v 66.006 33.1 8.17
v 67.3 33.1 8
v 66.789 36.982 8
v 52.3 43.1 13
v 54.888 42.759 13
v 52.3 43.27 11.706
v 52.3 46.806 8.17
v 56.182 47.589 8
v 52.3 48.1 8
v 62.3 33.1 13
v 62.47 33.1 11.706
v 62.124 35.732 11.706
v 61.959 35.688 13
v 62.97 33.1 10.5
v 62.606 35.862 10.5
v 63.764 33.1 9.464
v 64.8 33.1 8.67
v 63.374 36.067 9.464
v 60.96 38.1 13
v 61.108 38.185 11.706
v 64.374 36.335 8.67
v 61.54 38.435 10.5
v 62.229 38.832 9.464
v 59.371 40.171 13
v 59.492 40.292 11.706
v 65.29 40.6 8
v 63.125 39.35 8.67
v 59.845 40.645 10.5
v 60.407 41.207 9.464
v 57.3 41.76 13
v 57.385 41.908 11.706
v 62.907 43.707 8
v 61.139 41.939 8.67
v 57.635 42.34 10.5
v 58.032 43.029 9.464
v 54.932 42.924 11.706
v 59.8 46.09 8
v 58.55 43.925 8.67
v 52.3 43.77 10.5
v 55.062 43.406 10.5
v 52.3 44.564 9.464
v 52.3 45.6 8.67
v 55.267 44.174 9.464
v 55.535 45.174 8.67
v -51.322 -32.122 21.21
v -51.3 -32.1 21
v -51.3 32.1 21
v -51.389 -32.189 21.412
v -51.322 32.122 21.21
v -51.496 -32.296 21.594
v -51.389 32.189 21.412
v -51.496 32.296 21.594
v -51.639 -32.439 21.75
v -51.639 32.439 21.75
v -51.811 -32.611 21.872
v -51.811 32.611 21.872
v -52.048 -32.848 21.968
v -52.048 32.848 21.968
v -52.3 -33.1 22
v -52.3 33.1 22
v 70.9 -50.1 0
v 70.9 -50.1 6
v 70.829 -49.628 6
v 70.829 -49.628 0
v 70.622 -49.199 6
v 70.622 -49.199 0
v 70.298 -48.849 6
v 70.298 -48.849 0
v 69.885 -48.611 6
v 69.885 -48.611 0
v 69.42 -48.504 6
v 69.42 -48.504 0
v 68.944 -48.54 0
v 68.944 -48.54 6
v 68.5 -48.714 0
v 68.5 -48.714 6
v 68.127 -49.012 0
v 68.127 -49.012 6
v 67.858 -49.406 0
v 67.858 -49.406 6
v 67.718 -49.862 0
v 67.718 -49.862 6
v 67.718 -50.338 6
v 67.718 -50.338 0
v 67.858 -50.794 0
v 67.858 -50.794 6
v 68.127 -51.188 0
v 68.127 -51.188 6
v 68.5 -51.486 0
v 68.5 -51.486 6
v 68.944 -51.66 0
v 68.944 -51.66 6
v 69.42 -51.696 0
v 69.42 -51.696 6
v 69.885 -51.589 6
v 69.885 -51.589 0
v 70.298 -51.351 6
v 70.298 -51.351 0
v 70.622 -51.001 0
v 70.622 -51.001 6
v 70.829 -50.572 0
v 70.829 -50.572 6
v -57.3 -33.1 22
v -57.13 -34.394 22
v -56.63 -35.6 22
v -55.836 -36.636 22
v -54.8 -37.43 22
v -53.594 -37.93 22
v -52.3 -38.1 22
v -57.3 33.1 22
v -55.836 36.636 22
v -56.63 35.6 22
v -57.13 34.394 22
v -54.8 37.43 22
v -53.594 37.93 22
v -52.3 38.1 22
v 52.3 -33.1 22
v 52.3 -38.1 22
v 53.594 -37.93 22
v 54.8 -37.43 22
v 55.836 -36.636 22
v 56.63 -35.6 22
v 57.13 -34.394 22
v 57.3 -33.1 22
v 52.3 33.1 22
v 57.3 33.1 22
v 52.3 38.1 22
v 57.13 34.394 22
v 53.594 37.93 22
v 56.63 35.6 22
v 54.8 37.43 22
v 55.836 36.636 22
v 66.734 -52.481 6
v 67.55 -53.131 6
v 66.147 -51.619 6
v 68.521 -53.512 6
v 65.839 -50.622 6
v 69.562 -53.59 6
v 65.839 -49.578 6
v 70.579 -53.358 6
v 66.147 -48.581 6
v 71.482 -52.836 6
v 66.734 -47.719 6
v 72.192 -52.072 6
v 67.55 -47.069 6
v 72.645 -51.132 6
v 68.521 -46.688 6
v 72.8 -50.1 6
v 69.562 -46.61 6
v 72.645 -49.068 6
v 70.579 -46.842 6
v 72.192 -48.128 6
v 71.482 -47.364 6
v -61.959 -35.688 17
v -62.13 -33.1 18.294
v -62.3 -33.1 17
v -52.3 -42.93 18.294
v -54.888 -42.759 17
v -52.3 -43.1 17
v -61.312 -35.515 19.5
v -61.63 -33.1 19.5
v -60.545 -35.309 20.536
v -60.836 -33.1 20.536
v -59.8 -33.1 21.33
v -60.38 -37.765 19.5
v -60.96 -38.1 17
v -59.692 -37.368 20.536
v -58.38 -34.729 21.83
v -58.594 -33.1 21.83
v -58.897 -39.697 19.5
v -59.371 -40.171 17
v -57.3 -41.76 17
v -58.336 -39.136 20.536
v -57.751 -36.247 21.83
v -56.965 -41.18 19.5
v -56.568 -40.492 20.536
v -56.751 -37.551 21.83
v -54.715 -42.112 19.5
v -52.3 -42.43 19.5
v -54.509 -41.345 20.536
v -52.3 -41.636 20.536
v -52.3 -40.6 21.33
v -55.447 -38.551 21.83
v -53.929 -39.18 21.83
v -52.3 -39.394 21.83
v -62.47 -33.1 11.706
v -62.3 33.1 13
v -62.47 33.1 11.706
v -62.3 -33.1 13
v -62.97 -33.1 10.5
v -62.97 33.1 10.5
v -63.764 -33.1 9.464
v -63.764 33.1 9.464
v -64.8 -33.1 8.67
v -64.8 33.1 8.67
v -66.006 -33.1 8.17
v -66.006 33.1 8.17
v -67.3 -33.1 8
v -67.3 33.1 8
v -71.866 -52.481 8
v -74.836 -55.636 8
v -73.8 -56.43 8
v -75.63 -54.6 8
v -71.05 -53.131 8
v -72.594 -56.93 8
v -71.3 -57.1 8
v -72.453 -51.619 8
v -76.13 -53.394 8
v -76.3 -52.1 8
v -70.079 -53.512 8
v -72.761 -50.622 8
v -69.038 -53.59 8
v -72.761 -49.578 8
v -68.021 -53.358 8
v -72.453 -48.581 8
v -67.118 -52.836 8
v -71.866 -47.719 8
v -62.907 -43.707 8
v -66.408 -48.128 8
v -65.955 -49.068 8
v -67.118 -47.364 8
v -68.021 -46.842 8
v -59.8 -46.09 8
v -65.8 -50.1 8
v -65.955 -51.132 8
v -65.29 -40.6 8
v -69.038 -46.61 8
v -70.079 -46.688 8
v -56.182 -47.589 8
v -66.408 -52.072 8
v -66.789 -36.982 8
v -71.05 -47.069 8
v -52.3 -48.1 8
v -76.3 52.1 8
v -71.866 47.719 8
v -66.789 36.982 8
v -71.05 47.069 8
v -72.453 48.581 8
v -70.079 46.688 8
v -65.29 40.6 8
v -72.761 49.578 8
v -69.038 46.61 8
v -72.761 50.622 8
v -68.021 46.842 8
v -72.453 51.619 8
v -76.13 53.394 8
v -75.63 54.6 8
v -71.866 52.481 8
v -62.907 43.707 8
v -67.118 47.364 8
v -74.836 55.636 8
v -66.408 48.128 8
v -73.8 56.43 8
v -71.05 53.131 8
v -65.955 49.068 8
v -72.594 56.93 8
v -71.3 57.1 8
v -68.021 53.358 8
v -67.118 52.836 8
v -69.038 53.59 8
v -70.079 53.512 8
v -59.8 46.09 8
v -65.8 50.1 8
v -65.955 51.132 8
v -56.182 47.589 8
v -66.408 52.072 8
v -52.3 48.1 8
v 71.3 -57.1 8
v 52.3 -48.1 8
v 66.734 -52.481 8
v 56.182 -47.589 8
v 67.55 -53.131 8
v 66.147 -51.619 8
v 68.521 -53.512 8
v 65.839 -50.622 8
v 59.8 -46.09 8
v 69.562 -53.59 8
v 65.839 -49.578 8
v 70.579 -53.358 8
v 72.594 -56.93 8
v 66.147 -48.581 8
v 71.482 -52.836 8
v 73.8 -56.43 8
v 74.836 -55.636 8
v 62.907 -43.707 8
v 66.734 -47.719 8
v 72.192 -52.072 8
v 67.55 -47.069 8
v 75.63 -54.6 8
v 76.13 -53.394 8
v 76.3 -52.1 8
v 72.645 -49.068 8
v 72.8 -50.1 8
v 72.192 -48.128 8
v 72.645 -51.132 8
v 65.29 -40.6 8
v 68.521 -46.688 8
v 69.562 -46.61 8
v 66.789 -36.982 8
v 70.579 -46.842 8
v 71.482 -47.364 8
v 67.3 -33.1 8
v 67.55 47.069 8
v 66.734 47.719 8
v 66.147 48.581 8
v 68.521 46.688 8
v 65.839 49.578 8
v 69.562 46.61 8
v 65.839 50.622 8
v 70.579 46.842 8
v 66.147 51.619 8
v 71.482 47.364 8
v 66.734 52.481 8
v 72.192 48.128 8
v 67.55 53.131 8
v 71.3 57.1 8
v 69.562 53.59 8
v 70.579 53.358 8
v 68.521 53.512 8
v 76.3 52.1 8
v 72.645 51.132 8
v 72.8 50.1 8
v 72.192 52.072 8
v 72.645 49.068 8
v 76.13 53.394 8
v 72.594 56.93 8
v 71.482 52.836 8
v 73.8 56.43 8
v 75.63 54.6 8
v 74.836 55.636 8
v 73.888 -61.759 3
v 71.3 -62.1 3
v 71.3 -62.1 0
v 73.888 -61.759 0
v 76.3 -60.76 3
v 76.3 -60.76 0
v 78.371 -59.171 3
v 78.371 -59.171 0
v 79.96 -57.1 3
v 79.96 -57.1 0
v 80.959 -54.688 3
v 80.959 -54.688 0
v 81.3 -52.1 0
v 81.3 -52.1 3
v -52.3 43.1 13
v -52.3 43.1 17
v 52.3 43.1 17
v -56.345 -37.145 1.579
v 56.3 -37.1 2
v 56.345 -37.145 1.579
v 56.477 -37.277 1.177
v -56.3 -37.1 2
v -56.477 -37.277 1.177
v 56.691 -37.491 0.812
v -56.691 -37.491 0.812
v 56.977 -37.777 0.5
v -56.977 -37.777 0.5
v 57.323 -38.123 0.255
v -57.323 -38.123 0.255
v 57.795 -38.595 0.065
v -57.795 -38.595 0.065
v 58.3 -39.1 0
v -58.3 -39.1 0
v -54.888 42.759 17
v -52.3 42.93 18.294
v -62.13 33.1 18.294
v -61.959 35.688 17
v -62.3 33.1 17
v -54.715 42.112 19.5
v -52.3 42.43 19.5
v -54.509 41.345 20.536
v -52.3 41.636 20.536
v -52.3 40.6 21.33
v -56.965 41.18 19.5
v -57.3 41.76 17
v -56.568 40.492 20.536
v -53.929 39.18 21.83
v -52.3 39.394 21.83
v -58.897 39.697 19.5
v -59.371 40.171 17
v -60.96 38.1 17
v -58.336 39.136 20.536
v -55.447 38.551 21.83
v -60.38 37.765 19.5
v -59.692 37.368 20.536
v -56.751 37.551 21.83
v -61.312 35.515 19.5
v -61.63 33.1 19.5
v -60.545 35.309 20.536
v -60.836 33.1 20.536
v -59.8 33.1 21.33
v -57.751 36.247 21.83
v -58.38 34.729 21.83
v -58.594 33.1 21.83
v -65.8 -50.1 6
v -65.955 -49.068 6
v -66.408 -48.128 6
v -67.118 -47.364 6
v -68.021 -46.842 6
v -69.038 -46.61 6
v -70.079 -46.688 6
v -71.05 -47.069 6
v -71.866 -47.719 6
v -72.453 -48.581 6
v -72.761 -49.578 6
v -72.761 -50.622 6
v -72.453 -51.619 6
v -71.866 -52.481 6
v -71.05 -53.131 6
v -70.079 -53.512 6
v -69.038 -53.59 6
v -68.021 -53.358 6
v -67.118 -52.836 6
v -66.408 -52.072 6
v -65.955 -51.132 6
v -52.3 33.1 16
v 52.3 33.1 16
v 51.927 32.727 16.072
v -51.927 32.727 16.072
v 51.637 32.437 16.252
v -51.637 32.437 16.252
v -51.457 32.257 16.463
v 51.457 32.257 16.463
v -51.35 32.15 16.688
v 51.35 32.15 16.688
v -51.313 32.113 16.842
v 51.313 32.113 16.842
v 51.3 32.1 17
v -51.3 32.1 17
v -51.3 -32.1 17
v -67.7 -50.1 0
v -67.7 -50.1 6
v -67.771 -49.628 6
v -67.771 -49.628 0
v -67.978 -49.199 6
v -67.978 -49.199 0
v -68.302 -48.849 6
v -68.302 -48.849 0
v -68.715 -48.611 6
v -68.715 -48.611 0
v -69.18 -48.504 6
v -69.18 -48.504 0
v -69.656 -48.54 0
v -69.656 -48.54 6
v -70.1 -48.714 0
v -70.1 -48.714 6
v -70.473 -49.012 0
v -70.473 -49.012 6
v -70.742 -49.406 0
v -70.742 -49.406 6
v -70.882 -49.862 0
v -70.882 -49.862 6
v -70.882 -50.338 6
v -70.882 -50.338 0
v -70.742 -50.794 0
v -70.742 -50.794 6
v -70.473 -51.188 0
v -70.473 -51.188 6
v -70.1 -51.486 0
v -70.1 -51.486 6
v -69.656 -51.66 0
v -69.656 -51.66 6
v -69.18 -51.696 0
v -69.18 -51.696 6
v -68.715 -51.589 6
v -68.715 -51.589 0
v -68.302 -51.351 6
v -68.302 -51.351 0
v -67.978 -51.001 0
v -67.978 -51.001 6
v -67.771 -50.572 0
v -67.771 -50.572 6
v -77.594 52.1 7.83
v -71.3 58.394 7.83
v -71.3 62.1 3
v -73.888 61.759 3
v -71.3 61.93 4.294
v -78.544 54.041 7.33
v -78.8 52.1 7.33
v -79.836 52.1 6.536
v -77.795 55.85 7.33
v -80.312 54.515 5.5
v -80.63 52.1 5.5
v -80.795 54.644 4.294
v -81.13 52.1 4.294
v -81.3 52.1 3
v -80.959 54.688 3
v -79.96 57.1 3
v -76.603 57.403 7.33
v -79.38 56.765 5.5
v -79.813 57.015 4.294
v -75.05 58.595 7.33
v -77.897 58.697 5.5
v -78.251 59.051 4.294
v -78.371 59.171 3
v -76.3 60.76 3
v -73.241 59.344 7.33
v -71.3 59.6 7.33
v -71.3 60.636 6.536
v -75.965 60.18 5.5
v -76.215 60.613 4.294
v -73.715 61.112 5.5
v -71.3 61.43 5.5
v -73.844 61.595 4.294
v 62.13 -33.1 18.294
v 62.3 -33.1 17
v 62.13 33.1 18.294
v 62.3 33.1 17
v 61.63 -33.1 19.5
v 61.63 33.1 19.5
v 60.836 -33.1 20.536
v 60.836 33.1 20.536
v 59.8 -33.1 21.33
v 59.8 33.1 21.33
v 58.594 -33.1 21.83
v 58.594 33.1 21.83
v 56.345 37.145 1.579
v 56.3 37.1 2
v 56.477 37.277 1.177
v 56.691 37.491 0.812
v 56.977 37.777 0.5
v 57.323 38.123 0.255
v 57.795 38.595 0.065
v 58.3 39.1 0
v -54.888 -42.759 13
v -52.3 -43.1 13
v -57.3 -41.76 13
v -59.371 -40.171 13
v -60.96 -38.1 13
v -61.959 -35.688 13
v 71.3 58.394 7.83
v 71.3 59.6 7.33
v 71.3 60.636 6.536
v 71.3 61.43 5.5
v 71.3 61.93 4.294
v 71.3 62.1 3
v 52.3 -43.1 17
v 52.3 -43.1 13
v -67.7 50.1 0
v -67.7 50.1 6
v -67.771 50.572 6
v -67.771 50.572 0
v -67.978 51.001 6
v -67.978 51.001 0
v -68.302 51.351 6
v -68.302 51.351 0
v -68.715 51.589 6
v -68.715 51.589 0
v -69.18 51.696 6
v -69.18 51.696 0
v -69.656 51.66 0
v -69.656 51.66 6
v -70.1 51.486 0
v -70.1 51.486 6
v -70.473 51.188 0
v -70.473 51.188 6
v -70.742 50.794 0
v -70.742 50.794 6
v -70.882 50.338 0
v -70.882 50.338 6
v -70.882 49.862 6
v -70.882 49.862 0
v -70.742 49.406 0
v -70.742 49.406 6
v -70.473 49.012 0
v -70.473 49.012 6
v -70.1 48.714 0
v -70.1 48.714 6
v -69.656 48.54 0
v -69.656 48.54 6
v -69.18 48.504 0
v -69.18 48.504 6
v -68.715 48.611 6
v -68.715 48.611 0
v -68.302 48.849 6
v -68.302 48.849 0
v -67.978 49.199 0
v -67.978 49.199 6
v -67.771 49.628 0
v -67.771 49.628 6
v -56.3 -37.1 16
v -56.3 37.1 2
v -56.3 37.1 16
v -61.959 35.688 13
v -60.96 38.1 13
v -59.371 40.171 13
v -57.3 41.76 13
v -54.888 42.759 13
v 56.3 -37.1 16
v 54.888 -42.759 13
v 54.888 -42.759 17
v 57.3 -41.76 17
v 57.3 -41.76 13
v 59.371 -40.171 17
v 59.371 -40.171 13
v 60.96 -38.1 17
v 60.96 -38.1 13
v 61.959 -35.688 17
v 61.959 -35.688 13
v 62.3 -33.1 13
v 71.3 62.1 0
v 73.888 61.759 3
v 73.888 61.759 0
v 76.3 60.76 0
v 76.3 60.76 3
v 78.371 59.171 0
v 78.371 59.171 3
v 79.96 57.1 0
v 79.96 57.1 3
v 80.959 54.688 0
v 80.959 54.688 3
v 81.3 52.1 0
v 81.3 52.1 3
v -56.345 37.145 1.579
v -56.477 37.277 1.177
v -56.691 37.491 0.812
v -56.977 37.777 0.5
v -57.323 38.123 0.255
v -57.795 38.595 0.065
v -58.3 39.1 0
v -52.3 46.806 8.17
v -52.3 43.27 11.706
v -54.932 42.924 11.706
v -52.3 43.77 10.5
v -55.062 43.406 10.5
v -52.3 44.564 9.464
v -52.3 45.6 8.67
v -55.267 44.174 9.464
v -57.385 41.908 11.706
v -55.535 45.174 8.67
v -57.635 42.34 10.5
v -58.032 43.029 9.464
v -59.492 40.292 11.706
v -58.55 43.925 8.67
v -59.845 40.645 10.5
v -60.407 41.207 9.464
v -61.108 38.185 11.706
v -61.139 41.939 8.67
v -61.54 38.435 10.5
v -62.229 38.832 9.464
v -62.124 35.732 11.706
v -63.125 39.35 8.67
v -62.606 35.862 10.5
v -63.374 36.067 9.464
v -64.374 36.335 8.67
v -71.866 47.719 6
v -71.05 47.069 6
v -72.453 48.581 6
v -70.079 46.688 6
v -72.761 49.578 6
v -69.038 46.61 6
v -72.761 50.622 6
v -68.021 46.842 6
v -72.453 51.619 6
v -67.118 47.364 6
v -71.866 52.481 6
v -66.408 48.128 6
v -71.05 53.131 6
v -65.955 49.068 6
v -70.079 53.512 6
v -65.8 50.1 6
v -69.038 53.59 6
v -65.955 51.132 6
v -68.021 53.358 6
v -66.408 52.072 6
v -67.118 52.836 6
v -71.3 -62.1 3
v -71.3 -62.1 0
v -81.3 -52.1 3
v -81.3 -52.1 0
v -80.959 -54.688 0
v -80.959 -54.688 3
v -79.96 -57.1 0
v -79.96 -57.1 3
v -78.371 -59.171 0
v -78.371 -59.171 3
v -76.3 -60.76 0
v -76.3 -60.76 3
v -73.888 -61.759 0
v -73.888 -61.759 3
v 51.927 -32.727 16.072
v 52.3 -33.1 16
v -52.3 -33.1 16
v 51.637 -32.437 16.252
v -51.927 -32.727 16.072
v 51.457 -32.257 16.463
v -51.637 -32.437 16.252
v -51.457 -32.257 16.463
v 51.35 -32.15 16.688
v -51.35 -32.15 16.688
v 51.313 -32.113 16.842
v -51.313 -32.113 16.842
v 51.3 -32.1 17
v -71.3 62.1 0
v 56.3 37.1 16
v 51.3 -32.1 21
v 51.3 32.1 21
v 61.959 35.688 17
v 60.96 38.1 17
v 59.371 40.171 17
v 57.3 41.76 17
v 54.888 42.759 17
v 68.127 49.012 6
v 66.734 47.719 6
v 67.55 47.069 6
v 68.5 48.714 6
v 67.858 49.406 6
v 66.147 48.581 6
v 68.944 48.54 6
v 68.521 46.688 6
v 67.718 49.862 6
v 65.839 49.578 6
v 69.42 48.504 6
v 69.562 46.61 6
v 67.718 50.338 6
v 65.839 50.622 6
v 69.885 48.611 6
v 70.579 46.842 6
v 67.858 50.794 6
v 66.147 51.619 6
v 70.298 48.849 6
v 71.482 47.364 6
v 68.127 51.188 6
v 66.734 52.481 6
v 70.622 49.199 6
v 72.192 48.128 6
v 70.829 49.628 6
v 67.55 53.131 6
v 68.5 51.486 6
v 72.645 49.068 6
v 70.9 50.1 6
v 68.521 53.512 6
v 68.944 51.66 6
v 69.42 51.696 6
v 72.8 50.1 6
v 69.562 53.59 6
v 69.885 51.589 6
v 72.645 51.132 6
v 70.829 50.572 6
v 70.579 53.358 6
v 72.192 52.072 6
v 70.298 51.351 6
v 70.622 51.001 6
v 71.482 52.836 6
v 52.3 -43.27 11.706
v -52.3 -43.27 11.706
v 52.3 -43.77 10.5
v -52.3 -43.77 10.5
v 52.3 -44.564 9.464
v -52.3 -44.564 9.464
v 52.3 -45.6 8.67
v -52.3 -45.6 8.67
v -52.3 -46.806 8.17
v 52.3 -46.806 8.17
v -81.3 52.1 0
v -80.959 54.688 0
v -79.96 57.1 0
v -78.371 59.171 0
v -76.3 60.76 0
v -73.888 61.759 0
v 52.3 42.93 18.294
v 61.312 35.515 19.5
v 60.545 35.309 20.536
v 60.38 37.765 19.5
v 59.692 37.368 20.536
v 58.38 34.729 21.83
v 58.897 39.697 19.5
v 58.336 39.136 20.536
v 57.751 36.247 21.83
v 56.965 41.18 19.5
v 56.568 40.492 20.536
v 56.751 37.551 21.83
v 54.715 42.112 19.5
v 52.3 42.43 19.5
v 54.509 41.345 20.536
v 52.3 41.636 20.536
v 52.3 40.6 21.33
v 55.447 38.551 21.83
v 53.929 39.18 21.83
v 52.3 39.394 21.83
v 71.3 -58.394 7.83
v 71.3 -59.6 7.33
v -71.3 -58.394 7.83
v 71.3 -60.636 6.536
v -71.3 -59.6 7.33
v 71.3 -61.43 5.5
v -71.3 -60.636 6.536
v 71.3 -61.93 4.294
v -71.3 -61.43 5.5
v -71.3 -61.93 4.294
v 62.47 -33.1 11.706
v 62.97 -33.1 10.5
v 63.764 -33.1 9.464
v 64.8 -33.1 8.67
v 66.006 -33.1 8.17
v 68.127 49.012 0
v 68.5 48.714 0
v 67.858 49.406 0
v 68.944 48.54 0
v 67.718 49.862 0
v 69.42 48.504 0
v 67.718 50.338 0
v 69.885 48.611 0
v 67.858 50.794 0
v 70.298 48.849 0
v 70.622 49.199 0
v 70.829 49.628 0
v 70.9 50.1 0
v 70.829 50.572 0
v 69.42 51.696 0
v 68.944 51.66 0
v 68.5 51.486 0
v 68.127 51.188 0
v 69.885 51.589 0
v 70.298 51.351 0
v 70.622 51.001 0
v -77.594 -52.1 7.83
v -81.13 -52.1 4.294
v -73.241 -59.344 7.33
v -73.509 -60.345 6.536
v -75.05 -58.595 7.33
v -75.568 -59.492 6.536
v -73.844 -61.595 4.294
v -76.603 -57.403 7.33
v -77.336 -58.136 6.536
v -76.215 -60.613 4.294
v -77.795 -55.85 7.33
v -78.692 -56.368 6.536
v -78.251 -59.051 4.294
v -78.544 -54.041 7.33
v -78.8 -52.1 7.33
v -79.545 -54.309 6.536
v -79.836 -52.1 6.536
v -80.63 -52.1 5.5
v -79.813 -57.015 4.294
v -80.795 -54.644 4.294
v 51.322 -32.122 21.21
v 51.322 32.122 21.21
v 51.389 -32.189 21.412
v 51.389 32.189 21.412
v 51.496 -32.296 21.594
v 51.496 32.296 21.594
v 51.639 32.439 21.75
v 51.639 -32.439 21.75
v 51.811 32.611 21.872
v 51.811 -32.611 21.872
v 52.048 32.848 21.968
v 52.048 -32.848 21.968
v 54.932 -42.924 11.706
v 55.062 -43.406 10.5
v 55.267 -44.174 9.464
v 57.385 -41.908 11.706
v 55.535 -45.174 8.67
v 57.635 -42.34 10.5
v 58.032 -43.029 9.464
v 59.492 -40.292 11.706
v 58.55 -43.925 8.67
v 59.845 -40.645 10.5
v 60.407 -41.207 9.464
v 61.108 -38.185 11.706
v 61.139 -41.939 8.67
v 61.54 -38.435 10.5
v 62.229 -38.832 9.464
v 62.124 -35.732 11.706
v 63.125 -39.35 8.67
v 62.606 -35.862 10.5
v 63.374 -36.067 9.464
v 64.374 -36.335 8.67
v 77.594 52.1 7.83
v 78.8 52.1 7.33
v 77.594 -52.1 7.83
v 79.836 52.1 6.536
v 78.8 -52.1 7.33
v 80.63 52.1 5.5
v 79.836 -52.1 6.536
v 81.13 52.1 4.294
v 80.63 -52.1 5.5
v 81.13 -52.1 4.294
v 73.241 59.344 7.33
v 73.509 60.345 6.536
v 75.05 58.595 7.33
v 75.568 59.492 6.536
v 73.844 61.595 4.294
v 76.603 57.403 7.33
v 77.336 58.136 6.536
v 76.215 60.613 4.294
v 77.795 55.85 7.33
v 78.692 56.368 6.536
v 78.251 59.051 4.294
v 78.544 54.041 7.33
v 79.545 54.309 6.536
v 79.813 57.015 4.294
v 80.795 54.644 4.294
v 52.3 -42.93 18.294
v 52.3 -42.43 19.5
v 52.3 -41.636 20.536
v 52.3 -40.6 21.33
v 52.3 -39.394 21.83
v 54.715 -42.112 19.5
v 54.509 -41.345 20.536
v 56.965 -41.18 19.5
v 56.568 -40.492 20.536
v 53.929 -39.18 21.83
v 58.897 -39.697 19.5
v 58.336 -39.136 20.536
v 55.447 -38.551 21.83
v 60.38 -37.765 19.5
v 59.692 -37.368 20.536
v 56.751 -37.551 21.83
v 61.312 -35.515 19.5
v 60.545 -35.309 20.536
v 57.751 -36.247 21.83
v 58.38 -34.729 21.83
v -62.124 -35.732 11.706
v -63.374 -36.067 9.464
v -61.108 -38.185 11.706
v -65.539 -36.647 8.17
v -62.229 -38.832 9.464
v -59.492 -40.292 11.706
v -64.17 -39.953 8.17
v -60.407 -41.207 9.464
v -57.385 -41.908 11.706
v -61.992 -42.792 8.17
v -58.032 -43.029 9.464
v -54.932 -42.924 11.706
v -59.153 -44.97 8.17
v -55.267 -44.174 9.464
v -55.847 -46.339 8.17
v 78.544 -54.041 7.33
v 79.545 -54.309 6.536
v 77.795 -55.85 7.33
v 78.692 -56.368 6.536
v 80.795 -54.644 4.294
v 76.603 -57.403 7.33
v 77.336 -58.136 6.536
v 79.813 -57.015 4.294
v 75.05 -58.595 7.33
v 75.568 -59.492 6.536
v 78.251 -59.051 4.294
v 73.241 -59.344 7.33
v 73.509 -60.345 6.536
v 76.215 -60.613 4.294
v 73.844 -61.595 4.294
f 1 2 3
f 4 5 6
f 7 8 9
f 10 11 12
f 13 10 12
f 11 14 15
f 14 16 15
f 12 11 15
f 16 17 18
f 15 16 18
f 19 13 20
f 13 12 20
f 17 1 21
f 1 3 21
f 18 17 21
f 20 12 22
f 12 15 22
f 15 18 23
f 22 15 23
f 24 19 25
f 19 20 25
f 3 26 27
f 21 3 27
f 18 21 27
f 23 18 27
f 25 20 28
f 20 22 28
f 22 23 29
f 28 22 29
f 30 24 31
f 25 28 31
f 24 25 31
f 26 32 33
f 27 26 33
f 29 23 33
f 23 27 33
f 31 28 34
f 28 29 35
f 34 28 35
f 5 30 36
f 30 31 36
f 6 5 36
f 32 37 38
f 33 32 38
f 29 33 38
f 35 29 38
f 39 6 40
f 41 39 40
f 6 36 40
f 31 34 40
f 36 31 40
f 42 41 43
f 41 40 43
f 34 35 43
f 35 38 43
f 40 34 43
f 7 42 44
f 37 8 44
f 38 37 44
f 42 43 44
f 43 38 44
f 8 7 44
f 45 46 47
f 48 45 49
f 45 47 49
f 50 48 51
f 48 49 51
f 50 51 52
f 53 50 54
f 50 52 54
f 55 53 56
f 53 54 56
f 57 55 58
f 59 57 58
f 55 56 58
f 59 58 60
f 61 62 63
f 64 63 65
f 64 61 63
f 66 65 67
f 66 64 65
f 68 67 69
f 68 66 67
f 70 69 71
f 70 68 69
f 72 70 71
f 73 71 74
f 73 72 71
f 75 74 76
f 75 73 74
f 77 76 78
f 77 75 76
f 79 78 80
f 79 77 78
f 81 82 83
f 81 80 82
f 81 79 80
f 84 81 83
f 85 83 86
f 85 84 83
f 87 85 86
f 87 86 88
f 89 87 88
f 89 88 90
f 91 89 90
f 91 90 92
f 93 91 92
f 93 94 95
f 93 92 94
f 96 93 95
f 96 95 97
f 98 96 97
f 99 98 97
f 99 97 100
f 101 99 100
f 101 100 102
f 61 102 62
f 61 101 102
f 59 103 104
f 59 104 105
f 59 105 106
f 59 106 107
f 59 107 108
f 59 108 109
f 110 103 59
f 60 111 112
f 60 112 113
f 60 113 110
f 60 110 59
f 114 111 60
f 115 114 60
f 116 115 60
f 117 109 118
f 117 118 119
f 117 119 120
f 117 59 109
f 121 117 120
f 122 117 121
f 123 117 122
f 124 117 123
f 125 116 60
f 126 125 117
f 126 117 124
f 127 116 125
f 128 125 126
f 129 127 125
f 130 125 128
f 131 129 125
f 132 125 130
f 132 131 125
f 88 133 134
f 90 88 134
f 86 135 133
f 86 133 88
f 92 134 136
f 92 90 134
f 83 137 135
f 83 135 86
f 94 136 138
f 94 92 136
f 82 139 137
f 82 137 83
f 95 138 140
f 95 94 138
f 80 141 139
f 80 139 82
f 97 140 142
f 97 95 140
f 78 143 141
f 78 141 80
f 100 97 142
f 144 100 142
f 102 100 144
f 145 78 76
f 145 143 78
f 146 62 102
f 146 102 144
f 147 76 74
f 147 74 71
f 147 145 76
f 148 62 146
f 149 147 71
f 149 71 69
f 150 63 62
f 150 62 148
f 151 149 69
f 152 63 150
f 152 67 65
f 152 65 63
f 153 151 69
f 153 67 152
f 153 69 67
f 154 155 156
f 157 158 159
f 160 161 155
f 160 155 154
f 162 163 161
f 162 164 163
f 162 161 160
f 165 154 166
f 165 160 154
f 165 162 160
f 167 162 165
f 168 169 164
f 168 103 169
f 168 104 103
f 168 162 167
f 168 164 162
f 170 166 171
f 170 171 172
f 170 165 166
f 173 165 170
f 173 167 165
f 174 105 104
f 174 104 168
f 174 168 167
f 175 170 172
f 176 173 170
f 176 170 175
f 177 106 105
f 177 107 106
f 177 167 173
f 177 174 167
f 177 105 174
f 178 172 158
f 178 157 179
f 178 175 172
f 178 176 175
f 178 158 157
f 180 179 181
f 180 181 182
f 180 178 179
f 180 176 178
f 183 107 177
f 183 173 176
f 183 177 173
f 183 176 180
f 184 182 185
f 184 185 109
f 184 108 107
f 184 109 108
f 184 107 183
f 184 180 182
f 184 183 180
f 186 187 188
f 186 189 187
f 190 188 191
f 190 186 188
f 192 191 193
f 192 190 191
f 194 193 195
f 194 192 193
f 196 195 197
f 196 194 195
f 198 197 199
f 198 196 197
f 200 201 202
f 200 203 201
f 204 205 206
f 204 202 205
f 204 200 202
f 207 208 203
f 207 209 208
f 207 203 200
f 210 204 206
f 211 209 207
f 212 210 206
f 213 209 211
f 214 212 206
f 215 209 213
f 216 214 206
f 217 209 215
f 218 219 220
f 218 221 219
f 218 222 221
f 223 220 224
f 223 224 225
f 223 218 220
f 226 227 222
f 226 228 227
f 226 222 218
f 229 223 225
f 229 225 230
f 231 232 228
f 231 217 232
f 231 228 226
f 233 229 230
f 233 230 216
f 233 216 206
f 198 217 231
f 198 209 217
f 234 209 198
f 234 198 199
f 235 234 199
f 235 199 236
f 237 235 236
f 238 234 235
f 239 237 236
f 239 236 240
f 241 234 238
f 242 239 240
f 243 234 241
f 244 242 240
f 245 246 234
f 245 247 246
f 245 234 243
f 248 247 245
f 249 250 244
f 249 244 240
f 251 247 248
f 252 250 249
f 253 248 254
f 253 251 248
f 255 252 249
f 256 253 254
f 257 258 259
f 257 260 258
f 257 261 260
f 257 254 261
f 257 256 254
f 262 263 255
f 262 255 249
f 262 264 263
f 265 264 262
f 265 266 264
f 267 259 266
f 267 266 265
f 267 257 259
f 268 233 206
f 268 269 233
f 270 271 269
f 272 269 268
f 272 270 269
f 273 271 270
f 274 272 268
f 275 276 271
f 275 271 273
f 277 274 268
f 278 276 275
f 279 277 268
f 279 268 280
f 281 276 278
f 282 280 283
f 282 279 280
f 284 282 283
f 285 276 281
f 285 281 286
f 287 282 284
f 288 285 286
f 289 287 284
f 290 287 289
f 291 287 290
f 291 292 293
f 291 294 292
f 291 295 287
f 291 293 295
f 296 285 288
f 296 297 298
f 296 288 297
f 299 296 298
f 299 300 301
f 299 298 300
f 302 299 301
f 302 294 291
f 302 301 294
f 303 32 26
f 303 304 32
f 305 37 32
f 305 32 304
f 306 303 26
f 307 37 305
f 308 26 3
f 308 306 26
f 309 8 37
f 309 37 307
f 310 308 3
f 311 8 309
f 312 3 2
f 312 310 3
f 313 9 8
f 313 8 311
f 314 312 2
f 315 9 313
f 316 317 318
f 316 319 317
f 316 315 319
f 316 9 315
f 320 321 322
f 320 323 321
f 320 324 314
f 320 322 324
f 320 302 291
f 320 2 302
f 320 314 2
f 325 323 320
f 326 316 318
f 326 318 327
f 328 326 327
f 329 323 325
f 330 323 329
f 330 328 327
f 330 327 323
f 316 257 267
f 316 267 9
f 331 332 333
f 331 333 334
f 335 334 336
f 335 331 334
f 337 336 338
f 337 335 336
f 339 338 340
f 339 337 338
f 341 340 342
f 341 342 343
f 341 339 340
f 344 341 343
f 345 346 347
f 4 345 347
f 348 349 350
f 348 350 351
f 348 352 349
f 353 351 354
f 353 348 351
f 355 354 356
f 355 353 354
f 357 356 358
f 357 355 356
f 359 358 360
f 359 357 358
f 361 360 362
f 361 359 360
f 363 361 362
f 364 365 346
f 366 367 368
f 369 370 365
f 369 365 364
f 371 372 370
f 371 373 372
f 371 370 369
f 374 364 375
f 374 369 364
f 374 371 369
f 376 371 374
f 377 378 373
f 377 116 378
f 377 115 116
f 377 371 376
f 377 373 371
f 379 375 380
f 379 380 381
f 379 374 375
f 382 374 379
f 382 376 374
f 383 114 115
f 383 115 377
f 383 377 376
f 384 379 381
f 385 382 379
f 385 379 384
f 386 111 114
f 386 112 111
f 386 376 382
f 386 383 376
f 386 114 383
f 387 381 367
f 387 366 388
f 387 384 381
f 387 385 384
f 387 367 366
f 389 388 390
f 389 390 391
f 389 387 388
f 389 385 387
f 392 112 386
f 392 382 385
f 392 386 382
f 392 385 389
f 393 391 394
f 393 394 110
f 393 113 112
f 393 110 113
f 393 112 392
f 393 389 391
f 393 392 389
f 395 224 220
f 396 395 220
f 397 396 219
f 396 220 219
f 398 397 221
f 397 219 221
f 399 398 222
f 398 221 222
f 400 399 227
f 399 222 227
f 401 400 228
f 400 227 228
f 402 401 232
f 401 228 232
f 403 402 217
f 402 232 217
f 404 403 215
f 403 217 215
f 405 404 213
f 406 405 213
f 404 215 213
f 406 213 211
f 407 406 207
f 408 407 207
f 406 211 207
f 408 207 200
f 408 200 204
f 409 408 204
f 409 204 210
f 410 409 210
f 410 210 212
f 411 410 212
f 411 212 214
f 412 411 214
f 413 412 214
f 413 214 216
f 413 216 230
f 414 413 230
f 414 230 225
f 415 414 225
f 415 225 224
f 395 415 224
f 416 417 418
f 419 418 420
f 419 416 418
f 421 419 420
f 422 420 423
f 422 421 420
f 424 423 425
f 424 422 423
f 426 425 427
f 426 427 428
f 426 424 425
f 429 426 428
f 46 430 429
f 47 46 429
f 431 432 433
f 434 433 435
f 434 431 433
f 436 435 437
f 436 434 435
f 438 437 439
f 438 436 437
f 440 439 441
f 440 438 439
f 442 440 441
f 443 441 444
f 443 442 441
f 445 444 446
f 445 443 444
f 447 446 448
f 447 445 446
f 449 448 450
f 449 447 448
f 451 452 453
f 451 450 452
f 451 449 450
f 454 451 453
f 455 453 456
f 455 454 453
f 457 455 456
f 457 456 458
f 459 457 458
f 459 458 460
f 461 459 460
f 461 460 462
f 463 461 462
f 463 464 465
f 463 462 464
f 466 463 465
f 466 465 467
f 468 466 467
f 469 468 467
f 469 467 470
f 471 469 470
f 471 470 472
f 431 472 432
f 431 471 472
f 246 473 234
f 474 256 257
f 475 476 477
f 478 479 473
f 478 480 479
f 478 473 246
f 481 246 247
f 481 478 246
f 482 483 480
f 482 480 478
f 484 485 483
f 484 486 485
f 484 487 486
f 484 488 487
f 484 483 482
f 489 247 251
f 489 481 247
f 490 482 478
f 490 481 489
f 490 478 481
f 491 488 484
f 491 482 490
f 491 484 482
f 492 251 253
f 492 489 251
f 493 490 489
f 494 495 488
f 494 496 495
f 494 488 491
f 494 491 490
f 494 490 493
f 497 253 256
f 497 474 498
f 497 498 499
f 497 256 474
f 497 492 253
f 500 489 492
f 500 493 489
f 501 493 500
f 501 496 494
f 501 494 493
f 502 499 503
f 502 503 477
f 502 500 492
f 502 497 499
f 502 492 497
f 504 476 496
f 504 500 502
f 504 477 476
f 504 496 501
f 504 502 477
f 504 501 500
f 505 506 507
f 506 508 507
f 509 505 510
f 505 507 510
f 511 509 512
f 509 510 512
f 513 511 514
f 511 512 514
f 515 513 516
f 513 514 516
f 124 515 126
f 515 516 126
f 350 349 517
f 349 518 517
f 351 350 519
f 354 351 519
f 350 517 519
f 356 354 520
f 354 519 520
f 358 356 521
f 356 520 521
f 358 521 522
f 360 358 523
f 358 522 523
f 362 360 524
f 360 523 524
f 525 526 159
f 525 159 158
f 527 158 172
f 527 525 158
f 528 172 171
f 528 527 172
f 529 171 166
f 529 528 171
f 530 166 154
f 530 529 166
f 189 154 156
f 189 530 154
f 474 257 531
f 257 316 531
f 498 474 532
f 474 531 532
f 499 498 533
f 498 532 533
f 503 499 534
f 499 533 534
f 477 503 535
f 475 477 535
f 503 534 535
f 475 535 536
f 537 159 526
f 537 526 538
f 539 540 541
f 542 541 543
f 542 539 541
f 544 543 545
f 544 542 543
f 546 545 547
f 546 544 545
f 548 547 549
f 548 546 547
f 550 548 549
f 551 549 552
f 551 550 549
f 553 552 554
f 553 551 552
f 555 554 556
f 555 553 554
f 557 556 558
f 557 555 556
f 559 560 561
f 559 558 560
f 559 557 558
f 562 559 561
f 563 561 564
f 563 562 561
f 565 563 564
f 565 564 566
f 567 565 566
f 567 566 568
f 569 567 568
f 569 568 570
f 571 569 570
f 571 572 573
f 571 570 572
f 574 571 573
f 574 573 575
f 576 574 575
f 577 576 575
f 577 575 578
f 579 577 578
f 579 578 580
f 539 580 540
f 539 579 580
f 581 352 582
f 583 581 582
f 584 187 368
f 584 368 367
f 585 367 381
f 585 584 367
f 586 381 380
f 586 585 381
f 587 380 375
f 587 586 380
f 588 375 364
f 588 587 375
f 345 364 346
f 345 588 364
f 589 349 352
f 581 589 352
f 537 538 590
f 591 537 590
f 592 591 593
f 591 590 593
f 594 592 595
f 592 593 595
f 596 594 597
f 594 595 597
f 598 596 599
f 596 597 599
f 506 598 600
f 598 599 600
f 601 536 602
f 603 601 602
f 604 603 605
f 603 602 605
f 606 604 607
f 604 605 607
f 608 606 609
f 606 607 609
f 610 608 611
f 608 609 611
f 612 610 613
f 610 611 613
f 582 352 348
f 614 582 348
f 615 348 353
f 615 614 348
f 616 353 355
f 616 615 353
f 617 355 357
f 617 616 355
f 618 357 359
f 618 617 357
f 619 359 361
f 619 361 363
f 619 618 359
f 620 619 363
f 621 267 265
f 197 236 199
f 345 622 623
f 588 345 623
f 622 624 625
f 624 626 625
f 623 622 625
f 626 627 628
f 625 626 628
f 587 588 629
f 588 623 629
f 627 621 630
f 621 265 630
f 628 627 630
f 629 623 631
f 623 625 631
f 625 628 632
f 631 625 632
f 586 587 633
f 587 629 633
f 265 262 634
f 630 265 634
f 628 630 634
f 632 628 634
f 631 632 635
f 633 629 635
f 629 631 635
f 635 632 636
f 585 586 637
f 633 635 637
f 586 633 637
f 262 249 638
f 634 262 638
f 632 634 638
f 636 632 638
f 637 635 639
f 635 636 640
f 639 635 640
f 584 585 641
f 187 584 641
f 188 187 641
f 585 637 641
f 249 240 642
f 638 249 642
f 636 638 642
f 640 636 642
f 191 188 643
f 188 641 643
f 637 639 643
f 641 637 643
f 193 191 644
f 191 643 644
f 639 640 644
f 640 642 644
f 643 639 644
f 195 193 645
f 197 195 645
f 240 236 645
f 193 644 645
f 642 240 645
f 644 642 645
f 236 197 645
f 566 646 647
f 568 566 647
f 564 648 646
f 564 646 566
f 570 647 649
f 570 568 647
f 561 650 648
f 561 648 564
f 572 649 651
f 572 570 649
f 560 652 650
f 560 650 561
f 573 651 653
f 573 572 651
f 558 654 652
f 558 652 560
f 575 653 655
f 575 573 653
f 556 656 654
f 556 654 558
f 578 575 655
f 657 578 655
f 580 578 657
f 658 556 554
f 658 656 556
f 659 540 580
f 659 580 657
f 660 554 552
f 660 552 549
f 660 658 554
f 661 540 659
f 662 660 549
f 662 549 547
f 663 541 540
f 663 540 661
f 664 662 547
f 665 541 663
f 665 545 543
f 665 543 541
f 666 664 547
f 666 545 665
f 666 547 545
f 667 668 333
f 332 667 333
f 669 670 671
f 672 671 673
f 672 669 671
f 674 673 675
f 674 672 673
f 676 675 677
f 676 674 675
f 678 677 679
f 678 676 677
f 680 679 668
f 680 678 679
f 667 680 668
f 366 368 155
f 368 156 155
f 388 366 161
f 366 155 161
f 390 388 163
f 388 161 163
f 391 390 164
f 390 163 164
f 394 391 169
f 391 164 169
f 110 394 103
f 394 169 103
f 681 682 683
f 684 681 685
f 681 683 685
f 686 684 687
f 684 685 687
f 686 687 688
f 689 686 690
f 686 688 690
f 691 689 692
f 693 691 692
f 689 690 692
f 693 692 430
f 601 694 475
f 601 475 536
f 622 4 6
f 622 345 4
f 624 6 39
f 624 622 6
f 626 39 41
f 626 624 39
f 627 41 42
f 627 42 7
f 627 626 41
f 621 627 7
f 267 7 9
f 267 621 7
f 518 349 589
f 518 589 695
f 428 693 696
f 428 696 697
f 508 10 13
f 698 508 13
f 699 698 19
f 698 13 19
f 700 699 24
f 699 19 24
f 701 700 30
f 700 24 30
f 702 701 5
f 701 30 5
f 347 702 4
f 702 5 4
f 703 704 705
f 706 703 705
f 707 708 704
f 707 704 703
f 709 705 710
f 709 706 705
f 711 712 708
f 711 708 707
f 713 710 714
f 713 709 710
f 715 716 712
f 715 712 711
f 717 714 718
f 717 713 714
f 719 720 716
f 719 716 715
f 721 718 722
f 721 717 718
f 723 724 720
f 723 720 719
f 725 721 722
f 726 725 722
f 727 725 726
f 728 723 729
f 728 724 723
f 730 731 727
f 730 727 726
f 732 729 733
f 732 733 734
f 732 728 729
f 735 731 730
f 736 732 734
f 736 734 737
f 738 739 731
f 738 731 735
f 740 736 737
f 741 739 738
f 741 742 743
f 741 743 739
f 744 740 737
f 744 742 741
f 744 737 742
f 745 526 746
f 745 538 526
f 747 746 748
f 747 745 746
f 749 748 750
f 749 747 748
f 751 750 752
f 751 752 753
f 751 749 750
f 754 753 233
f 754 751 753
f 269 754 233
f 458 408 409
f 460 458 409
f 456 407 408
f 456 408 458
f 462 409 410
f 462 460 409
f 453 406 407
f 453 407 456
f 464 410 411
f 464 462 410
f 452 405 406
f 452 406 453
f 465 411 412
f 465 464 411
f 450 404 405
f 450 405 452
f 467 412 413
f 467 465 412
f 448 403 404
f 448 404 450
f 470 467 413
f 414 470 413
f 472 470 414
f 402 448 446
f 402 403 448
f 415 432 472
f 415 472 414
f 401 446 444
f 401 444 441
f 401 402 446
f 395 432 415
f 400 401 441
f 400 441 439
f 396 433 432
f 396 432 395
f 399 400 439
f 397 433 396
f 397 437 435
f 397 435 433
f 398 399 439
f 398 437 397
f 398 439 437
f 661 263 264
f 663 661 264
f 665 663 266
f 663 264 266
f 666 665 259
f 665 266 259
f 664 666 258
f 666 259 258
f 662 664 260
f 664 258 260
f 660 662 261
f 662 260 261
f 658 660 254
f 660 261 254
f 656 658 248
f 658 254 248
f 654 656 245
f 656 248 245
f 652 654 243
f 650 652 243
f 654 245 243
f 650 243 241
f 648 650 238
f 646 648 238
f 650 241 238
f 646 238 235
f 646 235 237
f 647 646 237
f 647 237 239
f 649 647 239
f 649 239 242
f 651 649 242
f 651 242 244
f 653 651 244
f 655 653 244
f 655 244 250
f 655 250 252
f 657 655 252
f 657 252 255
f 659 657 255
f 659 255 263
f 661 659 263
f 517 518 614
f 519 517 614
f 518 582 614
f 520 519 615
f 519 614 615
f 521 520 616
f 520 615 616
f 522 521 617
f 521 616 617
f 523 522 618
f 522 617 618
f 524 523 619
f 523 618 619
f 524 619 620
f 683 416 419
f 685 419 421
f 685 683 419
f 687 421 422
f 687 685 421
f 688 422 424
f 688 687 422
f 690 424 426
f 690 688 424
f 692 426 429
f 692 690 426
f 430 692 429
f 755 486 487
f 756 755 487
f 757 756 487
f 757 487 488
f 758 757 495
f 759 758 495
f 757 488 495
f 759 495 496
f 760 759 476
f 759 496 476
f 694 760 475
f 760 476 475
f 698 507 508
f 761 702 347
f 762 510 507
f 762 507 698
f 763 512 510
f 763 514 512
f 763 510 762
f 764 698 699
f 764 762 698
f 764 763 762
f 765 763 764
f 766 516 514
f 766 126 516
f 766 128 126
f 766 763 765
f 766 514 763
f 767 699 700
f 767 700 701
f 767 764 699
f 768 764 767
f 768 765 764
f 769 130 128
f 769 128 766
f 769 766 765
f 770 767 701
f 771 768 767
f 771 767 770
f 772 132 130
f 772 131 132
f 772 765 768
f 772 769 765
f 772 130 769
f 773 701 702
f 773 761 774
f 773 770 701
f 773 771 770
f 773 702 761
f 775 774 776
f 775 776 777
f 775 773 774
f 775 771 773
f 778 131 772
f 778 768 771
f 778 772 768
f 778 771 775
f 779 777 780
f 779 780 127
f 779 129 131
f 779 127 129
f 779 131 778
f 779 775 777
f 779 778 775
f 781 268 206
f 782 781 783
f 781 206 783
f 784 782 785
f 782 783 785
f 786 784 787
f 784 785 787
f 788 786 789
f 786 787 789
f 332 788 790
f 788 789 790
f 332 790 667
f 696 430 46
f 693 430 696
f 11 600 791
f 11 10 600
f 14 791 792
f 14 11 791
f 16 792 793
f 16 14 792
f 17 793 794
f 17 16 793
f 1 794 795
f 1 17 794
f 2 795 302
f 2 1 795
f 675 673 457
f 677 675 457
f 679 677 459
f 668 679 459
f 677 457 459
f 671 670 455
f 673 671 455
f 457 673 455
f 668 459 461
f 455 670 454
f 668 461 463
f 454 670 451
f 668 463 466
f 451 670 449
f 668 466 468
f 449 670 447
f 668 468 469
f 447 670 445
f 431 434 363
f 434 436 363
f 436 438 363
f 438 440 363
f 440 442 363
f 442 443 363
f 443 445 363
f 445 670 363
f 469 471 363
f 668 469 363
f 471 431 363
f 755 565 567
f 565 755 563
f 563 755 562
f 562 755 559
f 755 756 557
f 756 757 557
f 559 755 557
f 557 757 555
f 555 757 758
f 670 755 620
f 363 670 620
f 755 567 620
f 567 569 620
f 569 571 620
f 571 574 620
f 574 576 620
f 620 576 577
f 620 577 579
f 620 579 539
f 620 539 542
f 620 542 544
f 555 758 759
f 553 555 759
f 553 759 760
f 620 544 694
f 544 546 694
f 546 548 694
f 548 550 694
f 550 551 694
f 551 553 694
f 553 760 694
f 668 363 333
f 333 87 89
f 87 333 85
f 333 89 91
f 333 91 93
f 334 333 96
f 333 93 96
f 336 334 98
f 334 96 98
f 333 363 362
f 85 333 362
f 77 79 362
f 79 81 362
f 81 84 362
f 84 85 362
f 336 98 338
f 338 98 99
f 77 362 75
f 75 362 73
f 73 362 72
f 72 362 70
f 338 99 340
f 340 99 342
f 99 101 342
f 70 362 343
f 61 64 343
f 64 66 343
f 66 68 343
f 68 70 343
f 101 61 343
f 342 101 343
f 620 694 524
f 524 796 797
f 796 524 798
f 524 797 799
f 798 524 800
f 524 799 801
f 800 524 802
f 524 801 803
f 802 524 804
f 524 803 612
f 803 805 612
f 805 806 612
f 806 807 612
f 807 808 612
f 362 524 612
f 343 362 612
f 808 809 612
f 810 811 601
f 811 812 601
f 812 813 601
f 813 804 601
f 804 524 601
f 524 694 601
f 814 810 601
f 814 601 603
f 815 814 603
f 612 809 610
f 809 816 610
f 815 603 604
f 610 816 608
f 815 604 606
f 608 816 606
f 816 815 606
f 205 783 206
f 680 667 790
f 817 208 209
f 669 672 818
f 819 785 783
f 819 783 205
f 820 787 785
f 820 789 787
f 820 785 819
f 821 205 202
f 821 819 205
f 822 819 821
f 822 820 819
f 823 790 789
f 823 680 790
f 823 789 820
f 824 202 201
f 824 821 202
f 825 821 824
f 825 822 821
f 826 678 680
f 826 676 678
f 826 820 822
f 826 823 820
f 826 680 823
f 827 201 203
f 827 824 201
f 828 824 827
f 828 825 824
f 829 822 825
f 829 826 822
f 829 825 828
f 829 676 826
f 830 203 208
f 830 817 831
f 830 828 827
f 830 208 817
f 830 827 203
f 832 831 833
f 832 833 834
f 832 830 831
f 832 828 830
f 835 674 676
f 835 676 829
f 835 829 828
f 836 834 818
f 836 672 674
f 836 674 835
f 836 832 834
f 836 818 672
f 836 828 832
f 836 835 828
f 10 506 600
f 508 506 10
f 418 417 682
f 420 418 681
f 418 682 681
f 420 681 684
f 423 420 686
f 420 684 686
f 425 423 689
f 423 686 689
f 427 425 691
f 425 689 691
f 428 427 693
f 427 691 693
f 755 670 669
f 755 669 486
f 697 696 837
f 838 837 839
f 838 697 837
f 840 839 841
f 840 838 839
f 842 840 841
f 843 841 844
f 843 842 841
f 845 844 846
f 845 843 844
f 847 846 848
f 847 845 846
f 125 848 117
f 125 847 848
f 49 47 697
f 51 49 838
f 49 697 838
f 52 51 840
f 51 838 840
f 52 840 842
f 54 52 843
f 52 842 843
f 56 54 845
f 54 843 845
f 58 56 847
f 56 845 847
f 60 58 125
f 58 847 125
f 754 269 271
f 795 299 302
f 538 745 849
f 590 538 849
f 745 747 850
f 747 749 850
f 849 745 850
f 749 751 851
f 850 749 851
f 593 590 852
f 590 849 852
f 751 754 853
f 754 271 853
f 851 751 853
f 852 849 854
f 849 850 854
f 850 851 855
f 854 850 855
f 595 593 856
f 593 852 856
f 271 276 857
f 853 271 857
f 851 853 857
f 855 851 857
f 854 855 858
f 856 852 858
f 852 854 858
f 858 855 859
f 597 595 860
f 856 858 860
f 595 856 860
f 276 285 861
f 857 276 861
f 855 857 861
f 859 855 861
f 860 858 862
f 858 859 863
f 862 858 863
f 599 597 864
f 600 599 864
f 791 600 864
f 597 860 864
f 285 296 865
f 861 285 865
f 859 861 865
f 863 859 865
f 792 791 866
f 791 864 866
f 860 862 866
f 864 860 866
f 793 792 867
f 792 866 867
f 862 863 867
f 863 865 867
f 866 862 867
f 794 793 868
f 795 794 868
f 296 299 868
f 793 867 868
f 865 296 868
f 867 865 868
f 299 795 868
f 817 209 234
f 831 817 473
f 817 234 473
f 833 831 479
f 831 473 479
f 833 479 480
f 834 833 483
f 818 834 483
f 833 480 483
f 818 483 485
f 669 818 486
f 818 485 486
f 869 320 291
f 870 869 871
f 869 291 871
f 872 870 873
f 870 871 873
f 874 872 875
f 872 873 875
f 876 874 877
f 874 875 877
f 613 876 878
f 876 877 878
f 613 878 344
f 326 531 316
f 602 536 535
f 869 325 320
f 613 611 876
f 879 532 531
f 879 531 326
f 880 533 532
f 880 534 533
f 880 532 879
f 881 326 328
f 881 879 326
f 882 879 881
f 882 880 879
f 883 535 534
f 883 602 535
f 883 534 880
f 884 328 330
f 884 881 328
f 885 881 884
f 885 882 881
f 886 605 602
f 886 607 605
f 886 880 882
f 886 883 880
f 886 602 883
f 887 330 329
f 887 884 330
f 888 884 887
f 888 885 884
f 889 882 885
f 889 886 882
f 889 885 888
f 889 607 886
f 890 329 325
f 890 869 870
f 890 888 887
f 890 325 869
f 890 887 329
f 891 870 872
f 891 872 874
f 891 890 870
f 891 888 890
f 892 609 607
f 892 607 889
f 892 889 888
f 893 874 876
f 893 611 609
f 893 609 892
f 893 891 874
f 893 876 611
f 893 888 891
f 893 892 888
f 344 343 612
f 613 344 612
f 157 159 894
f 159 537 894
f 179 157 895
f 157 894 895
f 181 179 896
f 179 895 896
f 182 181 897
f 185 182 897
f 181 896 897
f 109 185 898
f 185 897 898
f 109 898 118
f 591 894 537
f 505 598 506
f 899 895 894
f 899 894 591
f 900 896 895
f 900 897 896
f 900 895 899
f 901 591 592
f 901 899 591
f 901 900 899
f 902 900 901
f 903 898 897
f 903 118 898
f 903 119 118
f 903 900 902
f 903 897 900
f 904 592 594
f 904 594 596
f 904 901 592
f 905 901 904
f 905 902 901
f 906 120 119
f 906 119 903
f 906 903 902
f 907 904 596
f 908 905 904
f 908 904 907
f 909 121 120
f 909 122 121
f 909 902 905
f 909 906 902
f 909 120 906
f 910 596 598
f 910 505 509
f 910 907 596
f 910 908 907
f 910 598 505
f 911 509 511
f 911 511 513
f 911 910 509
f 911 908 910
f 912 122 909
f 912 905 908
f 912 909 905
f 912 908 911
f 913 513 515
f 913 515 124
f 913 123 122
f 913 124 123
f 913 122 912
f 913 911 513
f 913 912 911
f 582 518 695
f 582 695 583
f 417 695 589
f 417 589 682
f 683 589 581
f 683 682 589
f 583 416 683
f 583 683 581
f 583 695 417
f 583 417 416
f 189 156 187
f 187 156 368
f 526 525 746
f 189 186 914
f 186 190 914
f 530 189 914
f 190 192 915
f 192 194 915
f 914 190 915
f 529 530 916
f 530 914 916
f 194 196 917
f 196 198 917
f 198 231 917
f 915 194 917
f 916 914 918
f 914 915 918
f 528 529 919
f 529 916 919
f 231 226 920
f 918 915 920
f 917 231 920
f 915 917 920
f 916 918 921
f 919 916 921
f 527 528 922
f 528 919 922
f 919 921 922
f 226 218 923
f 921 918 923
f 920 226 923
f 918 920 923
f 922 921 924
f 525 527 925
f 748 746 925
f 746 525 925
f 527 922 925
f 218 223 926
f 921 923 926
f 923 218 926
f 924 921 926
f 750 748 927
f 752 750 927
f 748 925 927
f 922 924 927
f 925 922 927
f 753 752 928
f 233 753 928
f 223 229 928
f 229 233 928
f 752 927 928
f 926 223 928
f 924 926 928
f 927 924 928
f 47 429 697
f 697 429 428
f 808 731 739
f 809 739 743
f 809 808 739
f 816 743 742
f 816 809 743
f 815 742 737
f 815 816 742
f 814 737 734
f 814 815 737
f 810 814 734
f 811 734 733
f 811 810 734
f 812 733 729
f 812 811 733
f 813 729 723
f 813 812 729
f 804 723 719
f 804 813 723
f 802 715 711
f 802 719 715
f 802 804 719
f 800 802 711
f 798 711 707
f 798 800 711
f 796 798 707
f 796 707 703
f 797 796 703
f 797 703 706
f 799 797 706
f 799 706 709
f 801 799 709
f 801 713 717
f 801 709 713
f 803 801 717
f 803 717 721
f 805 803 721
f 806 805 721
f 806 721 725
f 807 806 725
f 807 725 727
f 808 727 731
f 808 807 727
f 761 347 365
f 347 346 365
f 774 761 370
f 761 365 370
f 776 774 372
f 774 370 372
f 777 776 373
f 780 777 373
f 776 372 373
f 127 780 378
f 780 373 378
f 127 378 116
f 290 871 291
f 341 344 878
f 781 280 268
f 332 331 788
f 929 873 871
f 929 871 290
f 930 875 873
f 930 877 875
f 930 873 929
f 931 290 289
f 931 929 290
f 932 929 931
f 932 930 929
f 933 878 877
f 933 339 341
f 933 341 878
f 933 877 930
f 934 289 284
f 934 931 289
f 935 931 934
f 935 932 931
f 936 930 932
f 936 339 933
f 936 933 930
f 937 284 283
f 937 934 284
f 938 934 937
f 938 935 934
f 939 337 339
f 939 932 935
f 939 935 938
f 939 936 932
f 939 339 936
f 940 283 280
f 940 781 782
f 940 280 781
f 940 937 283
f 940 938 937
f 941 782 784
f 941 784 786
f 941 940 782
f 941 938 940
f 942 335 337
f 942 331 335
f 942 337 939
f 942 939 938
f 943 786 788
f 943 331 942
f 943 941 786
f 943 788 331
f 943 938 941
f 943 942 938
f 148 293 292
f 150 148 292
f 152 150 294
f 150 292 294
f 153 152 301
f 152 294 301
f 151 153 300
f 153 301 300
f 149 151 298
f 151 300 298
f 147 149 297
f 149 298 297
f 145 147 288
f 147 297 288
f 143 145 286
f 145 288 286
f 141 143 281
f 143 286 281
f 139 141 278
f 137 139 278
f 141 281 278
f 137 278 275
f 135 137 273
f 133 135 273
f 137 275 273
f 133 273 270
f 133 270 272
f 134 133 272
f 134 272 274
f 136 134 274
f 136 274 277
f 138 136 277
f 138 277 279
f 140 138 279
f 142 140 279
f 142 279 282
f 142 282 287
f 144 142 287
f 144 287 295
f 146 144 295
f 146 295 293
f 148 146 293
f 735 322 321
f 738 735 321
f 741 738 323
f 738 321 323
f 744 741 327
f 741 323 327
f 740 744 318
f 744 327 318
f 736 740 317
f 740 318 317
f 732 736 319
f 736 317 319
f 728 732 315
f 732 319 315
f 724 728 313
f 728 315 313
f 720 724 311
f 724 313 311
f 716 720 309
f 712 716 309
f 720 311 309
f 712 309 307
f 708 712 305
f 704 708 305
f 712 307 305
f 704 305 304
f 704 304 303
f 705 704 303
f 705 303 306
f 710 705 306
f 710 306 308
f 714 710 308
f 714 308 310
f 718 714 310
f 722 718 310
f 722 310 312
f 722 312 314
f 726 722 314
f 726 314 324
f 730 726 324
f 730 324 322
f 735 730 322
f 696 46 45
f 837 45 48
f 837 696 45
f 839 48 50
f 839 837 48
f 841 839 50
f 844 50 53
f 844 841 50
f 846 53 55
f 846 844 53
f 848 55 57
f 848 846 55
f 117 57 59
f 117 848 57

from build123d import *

# Parameters (mm, degrees)
SKETCH_1_W          = 162.6
SKETCH_1_H          = 124.2
SKETCH_1_R          = 1.6
SKETCH_1_W_2        = 102.6
SKETCH_1_H_2        = 64.2
EXTRUDE_1_DEPTH     = 22
SKETCH_2_R          = 3.5
CUT_EXTRUDE_1_DEPTH = 16
SKETCH_3_W          = 112.6
SKETCH_3_H          = 74.2
CUT_EXTRUDE_2_DEPTH = 16
SKETCH_4_W          = 162.6
SKETCH_4_H          = 124.2
SKETCH_4_W_2        = 124.6
SKETCH_4_H_2        = 86.2
CUT_EXTRUDE_3_DEPTH = 14
FILLET_1_R          = 10
FILLET_2_R          = 5
FILLET_3_R          = 1
FILLET_4_R          = 2
FILLET_5_R          = 1
FILLET_6_R          = 5


with BuildPart() as part:
    # 스케치1 → 보스-돌출1 (new body)
    with BuildSketch(Plane.XY):
        Rectangle(SKETCH_1_W, SKETCH_1_H)
        with Locations((-69.3, -50.1)):
            Circle(SKETCH_1_R, mode=Mode.SUBTRACT)
        with Locations((69.3, -50.1)):
            Circle(SKETCH_1_R, mode=Mode.SUBTRACT)
        with Locations((69.3, 50.1)):
            Circle(SKETCH_1_R, mode=Mode.SUBTRACT)
        with Locations((-69.3, 50.1)):
            Circle(SKETCH_1_R, mode=Mode.SUBTRACT)
        Rectangle(SKETCH_1_W_2, SKETCH_1_H_2, mode=Mode.SUBTRACT)
    extrude(amount=EXTRUDE_1_DEPTH)

    # 스케치2 → 컷-돌출1 (cut)
    with BuildSketch(Plane.XY.offset(22)):
        with Locations((-69.3, 50.1)):
            Circle(SKETCH_2_R)
        with Locations((69.3, 50.1)):
            Circle(SKETCH_2_R)
        with Locations((69.3, -50.1)):
            Circle(SKETCH_2_R)
        with Locations((-69.3, -50.1)):
            Circle(SKETCH_2_R)
    extrude(amount=-CUT_EXTRUDE_1_DEPTH, mode=Mode.SUBTRACT)

    # 스케치3 → 컷-돌출2 (cut)
    with BuildSketch(Plane(origin=(0, 0, 0), x_dir=(-1, 0, 0), z_dir=(0, 0, -1))):
        Rectangle(SKETCH_3_W, SKETCH_3_H)
    extrude(amount=-CUT_EXTRUDE_2_DEPTH, mode=Mode.SUBTRACT)

    # 스케치4 → 컷-돌출3 (cut)
    with BuildSketch(Plane.XY.offset(22)):
        Rectangle(SKETCH_4_W, SKETCH_4_H)
        Rectangle(SKETCH_4_W_2, SKETCH_4_H_2, mode=Mode.SUBTRACT)
    extrude(amount=-CUT_EXTRUDE_3_DEPTH, mode=Mode.SUBTRACT)

    # 필렛1
    fillet_1_edges = [part.edges().sort_by_distance(p)[0] for p in [
        (62.3, 43.1, 15),
        (-62.3, 43.1, 15),
        (-81.3, 62.1, 4),
        (81.3, 62.1, 4),
        (81.3, -62.1, 4),
        (-81.3, -62.1, 4),
        (-62.3, -43.1, 15),
        (62.3, -43.1, 15),
    ]]
    fillet(fillet_1_edges, radius=FILLET_1_R)

    # 필렛2
    fillet_2_edges = [part.edges().sort_by_distance(p)[0] for p in [
        (0, -43.1, 22),
        (-62.3, 0, 22),
        (62.3, 0, 22),
        (0, 43.1, 22),
        (-59.371067812, -40.171067812, 22),
        (-59.371067812, 40.171067812, 22),
        (59.371067812, 40.171067812, 22),
        (59.371067812, -40.171067812, 22),
        (0, 62.1, 8),
        (81.3, 0, 8),
        (-81.3, 0, 8),
        (0, -62.1, 8),
        (-78.371067812, 59.171067812, 8),
        (-78.371067812, -59.171067812, 8),
        (78.371067812, -59.171067812, 8),
        (78.371067812, 59.171067812, 8),
    ]]
    fillet(fillet_2_edges, radius=FILLET_2_R)

    # 필렛3
    fillet_3_edges = [part.edges().sort_by_distance(p)[0] for p in [
        (-51.3, 0, 22),
        (0, -32.1, 22),
        (51.3, 0, 22),
        (0, 32.1, 22),
    ]]
    fillet(fillet_3_edges, radius=FILLET_3_R)

    # 필렛4
    fillet_4_edges = [part.edges().sort_by_distance(p)[0] for p in [
        (-56.3, 0, 0),
        (0, 37.1, 0),
        (56.3, 0, 0),
        (0, -37.1, 0),
    ]]
    fillet(fillet_4_edges, radius=FILLET_4_R)

    # 필렛5
    fillet_5_edges = [part.edges().sort_by_distance(p)[0] for p in [
        (0, 32.1, 16),
        (-51.3, 0, 16),
        (0, -32.1, 16),
        (51.3, 0, 16),
    ]]
    fillet(fillet_5_edges, radius=FILLET_5_R)

    # 필렛6
    fillet_6_edges = [part.edges().sort_by_distance(p)[0] for p in [
        (0, -43.1, 8),
        (62.3, 0, 8),
        (0, 43.1, 8),
        (-62.3, 0, 8),
        (59.371067812, -40.171067812, 8),
        (59.371067812, 40.171067812, 8),
        (-59.371067812, 40.171067812, 8),
        (-59.371067812, -40.171067812, 8),
    ]]
    fillet(fillet_6_edges, radius=FILLET_6_R)


solid = part.part
